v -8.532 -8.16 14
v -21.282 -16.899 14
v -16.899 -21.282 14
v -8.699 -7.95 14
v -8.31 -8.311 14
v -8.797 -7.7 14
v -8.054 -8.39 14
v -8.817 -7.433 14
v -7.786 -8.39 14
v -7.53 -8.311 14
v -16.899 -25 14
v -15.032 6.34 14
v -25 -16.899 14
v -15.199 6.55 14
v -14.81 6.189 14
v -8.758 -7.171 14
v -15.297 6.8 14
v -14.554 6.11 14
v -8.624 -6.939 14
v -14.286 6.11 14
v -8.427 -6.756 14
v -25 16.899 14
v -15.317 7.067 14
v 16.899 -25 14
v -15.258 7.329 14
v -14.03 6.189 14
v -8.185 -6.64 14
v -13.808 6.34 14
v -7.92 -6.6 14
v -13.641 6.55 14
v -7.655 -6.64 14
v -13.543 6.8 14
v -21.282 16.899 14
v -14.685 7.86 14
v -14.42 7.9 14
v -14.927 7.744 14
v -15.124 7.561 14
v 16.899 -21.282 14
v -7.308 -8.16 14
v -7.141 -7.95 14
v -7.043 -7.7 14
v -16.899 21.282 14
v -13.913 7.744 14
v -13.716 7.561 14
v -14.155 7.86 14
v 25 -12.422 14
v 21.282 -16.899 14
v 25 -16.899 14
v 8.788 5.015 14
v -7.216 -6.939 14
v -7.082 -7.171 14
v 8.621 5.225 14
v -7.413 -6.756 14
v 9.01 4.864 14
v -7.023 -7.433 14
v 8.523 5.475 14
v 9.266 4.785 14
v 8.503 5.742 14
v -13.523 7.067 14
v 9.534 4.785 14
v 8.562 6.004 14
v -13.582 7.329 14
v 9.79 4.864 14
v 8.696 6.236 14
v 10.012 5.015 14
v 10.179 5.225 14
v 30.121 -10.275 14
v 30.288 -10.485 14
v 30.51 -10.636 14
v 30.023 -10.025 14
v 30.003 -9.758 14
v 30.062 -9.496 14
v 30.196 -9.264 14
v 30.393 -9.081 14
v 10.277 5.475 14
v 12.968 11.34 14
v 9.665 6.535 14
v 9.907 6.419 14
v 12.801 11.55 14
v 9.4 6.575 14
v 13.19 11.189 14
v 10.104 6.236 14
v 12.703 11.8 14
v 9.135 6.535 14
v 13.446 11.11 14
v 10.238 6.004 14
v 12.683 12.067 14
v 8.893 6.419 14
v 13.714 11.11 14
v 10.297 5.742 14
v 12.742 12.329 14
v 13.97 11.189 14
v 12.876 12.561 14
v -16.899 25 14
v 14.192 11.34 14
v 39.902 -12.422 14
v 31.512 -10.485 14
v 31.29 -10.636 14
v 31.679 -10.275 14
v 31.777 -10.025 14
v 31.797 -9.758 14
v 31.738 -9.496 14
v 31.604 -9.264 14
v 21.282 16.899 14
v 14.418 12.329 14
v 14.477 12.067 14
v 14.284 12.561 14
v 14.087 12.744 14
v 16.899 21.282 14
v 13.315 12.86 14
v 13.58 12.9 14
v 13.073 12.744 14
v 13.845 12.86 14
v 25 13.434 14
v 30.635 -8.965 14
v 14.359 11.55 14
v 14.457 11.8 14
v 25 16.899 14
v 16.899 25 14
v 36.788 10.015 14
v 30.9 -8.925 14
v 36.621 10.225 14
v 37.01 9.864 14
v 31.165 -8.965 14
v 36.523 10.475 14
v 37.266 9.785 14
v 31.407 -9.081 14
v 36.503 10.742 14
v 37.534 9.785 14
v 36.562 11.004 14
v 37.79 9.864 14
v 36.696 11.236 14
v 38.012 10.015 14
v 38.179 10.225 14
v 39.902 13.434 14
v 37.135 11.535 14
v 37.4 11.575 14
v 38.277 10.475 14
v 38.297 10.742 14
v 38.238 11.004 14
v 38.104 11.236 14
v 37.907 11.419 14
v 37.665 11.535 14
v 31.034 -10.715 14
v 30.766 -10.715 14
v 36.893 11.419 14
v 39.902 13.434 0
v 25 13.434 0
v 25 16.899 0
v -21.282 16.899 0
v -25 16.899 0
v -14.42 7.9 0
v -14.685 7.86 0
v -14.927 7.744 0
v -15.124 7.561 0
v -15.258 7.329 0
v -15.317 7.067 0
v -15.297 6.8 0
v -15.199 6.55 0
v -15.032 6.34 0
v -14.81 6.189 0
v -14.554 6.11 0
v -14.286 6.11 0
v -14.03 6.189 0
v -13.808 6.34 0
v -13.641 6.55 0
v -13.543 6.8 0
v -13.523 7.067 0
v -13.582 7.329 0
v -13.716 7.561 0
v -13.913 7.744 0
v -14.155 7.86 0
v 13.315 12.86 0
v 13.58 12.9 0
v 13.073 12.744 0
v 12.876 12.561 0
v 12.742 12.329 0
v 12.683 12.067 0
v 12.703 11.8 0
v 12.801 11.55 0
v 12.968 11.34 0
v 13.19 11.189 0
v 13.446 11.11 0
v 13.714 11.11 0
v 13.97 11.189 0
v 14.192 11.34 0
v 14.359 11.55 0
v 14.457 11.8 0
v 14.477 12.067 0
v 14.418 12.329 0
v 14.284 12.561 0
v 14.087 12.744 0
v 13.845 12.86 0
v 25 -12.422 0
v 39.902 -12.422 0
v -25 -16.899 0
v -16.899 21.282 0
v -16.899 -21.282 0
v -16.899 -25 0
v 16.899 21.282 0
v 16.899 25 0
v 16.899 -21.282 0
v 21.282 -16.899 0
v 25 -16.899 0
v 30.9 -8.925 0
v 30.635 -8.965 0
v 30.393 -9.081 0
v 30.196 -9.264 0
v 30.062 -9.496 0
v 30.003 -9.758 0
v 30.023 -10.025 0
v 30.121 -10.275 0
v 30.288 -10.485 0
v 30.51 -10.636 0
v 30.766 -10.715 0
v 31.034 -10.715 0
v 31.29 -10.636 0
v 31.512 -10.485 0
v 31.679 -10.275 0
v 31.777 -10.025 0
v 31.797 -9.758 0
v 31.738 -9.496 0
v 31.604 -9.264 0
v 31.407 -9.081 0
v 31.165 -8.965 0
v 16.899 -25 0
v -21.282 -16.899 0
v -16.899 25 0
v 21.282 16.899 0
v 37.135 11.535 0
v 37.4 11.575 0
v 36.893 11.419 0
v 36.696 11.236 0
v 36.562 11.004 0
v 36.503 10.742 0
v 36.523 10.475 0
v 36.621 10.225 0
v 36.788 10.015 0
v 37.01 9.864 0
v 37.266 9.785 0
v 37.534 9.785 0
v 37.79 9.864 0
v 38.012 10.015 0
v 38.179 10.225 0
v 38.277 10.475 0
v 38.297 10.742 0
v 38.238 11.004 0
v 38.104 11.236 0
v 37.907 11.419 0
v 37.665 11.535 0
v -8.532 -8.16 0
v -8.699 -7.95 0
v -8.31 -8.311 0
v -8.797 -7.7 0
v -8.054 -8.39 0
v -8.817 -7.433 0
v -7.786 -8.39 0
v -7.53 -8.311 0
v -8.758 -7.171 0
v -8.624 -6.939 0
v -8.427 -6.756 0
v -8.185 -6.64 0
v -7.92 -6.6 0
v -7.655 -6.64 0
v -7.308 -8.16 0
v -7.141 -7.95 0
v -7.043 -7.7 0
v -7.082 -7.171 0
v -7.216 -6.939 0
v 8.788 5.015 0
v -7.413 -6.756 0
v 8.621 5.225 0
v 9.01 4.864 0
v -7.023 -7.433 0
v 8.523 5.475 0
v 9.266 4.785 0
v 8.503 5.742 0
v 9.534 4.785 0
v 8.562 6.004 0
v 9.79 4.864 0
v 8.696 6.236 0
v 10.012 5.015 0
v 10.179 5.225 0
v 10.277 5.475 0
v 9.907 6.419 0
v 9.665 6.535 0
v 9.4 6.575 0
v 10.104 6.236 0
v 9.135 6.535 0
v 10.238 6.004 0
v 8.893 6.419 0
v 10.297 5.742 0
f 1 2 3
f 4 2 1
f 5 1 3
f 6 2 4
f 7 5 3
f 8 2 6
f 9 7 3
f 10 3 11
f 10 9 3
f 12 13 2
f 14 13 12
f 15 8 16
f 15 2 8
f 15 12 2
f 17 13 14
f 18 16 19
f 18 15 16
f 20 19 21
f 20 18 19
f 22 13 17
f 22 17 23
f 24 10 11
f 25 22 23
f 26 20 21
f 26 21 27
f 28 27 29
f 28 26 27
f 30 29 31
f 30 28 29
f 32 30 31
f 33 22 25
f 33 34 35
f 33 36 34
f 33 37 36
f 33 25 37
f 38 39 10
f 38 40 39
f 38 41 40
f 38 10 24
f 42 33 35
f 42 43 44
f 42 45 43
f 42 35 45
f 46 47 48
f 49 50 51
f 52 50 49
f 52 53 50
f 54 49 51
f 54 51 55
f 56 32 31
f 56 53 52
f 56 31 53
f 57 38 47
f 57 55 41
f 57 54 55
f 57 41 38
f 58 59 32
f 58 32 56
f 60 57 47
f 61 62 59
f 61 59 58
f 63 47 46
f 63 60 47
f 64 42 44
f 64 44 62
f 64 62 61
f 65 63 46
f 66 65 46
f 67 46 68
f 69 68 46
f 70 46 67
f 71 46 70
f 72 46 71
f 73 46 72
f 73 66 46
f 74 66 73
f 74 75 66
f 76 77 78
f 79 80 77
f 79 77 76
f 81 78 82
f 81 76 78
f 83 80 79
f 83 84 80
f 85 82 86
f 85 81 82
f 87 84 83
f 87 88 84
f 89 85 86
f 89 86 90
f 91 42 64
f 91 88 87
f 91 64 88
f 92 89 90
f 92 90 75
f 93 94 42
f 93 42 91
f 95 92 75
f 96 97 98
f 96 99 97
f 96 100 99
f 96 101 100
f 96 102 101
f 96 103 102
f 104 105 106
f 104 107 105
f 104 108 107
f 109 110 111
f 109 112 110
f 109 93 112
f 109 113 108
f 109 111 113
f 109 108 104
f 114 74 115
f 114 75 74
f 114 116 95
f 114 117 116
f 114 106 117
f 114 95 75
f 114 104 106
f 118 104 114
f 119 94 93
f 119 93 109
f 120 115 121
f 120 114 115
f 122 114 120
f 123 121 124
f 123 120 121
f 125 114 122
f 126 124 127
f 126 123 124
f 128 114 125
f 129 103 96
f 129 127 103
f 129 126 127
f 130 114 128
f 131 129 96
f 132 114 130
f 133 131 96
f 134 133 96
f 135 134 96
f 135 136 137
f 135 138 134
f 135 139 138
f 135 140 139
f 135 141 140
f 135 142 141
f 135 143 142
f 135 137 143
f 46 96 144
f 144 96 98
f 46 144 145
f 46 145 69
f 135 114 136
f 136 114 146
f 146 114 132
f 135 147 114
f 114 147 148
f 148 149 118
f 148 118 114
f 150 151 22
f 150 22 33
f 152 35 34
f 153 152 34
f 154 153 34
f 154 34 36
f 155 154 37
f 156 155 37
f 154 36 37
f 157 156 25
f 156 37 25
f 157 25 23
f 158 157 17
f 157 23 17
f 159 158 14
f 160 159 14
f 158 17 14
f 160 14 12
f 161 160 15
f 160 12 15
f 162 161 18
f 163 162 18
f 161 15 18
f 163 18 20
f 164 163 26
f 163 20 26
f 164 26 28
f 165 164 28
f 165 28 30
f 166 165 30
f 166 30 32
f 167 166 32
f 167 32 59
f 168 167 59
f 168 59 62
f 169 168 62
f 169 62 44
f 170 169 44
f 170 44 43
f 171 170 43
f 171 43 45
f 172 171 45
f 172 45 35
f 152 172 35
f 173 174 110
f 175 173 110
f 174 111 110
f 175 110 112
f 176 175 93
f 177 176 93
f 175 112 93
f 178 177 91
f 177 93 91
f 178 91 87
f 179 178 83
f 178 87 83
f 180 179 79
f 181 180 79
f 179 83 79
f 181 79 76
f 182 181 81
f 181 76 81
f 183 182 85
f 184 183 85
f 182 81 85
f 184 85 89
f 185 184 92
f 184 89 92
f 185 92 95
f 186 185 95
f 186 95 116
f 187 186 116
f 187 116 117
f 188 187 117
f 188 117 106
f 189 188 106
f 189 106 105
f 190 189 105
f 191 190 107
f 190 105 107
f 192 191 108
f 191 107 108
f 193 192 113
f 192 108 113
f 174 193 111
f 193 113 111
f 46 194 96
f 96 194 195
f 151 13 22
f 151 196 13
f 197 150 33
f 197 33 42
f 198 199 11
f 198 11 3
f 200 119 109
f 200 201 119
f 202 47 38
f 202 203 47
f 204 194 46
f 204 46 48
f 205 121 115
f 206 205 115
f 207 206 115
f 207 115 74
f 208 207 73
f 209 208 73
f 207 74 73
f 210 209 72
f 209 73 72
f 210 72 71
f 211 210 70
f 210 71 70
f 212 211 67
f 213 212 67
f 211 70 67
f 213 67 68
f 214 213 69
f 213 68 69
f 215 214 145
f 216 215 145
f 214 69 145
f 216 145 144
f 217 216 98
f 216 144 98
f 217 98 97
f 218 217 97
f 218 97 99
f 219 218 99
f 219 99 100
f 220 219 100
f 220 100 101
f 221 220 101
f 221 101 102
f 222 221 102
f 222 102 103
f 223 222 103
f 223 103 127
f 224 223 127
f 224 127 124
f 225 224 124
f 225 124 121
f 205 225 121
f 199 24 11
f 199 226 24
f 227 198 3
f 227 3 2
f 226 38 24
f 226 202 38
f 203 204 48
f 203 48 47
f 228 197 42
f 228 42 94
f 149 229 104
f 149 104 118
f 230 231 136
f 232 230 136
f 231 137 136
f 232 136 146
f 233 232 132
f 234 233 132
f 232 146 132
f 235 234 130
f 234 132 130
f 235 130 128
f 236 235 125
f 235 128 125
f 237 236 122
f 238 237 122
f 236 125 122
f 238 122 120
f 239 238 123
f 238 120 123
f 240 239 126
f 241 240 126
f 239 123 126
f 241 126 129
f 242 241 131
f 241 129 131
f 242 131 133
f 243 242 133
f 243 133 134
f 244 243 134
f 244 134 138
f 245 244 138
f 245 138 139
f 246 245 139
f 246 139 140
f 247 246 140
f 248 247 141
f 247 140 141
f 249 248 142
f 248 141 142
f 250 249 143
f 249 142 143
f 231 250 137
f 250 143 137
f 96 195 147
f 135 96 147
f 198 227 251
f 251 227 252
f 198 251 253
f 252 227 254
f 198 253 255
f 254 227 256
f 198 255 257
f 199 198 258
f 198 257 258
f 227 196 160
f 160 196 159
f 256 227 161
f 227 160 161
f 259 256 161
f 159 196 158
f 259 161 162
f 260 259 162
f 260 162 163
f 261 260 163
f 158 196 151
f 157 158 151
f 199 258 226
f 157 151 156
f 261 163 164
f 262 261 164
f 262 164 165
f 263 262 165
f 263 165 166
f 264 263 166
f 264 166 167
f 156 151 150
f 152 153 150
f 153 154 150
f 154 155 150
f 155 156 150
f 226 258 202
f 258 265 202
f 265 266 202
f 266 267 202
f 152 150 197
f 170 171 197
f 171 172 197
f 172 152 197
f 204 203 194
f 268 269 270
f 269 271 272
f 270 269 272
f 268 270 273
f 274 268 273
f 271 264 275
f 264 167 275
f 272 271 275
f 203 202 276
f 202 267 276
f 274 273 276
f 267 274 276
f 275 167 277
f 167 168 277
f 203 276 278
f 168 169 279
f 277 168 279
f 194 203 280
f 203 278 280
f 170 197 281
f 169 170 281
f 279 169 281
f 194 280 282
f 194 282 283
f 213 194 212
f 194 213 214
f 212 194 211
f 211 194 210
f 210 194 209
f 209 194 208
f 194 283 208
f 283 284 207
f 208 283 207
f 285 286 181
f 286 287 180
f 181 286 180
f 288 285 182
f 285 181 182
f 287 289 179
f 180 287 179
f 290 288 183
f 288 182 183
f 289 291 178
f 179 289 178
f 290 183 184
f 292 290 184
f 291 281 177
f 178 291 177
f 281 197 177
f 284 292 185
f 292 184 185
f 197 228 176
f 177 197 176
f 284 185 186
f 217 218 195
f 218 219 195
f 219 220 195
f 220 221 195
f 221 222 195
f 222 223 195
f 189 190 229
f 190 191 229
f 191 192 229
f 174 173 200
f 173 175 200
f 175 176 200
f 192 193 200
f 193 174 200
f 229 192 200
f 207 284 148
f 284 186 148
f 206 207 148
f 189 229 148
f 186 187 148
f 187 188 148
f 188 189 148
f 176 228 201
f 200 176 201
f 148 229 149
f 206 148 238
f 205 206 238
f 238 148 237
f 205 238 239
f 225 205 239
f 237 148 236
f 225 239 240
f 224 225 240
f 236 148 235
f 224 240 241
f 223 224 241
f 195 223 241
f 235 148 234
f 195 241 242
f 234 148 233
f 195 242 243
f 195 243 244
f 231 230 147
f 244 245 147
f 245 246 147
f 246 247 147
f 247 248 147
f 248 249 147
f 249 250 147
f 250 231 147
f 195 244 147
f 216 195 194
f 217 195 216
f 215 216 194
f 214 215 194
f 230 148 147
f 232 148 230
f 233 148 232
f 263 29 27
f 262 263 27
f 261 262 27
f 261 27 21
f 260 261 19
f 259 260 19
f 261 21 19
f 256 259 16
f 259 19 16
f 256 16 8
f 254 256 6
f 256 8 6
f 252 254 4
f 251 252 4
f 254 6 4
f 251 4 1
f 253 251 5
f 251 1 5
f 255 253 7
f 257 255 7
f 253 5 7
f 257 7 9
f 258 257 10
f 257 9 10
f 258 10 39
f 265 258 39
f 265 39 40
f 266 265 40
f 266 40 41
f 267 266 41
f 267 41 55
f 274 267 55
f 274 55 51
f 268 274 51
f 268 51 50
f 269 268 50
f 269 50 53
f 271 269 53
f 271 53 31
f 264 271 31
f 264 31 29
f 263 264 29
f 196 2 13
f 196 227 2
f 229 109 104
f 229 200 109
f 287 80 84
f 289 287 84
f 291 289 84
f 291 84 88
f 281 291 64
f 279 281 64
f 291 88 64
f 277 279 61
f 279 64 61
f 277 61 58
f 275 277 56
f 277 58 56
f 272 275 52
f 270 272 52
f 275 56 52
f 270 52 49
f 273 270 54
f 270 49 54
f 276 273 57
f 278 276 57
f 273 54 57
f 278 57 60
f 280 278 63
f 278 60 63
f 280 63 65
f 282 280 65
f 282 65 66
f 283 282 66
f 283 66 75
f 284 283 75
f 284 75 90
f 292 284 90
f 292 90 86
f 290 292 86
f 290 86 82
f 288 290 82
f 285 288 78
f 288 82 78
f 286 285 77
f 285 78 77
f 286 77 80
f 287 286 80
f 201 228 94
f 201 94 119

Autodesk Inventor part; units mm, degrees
ref_plane "YZ Plane" through (0, 0, 0) normal (1, 0, 0) x (0, 1, 0)
ref_plane "XZ Plane" through (0, 0, 0) normal (0, 1, 0) x (-1, 0, 0)
ref_plane "XY Plane" through (0, 0, 0) normal (0, 0, 1) x (1, 0, 0)
sketch "Sketch1" plane through (0, 0, 0) normal (0, 0, 1) x (1, 0, 0)
  line L0 (-37.8611, 0) -> (52.8619, 0) construction
  line L1 (0, -34.8609) -> (0, 34.8609) construction
  line L2 (0, 0) -> (13.4339, 13.4339) construction
  line L3 (0, 0) -> (18.9985, 0) construction
  line L4 (0, 24.9006) -> (16.8, 24.9006)
  line L5 (16.8, 24.9006) -> (16.8, 21.2406)
  line L6 (16.8, 21.2406) -> (19.0203, 19.0203)
  line L7 (24.9006, 0) -> (24.9006, 16.8)
  line L8 (24.9006, 16.8) -> (21.2406, 16.8)
  line L9 (21.2406, 16.8) -> (19.0203, 19.0203)
  line L10 (0, 0) -> (-13.4339, 13.4339) construction
  line L11 (0, 0) -> (-18.9985, 0) construction
  line L12 (0, 24.9006) -> (-16.8, 24.9006)
  line L13 (-16.8, 24.9006) -> (-16.8, 21.2406)
  line L14 (-16.8, 21.2406) -> (-19.0203, 19.0203)
  line L15 (-24.9006, 0) -> (-24.9006, 16.8)
  line L16 (-24.9006, 16.8) -> (-21.2406, 16.8)
  line L17 (-21.2406, 16.8) -> (-19.0203, 19.0203)
  line L18 (0, 0) -> (13.4339, -13.4339) construction
  line L19 (0, -24.9006) -> (16.8, -24.9006)
  line L20 (16.8, -24.9006) -> (16.8, -21.2406)
  line L21 (16.8, -21.2406) -> (19.0203, -19.0203)
  line L22 (24.9006, 0) -> (24.9006, -16.8)
  line L23 (24.9006, -16.8) -> (21.2406, -16.8)
  line L24 (21.2406, -16.8) -> (19.0203, -19.0203)
  line L25 (0, 0) -> (-13.4339, -13.4339) construction
  line L26 (0, -24.9006) -> (-16.8, -24.9006)
  line L27 (-16.8, -24.9006) -> (-16.8, -21.2406)
  line L28 (-16.8, -21.2406) -> (-19.0203, -19.0203)
  line L29 (-24.9006, 0) -> (-24.9006, -16.8)
  line L30 (-24.9006, -16.8) -> (-21.2406, -16.8)
  line L31 (-21.2406, -16.8) -> (-19.0203, -19.0203)
  circle A0 centre (37.4, 10.6752) radius 1 projected
  circle A1 centre (30.9, -9.8248) radius 1 projected
  line L32 (39.9015, 13.4339) -> (24.9006, 13.4339)
  line L33 (24.9006, 13.4339) -> (24.9006, -12.4218)
  line L34 (24.9006, -12.4218) -> (39.9015, -12.4218)
  line L35 (39.9015, -12.4218) -> (39.9015, 13.4339)
  dimension "d0" = 45
  dimension "d1" = 3.14
  dimension "d2" = 3.66
  dimension "d3" = 16.8
extrude "Thickness" add sketch "Sketch1" along normal blind 14 contours L4 L5 L6 L9 L8 L7 L22 L23 L24 L21 L20 L19 L26 L27 L28 L31 L30 L29 L15 L16 L17 L14 L13 L12 | L32 L35 L34 L22 L7 | A0 | A1
sketch "Sketch3" plane through (0, 0, 0) normal (0, 0, -1) x (-1, 0, 0)
  line L0 (-16.8, 24.9006) -> (16.8, 24.9006) projected
  line L1 (16.8, 24.9006) -> (16.8, 21.2406) projected
  line L2 (16.8, 21.2406) -> (21.2406, 16.8) projected
  line L3 (21.2406, 16.8) -> (24.9006, 16.8) projected
  line L4 (24.9006, 16.8) -> (24.9006, -16.8) projected
  line L5 (24.9006, -16.8) -> (21.2406, -16.8) projected
  line L6 (21.2406, -16.8) -> (16.8, -21.2406) projected
  line L7 (16.8, -21.2406) -> (16.8, -24.9006) projected
  line L8 (16.8, -24.9006) -> (-16.8, -24.9006) projected
  line L9 (-16.8, -24.9006) -> (-16.8, -21.2406) projected
  line L10 (-16.8, -21.2406) -> (-21.2406, -16.8) projected
  line L11 (-21.2406, -16.8) -> (-24.9006, -16.8) projected
  line L12 (-24.9006, -16.8) -> (-24.9006, -12.4218) projected
  line L13 (-24.9006, 16.8) -> (-21.2406, 16.8) projected
  line L14 (-21.2406, 16.8) -> (-16.8, 21.2406) projected
  line L15 (-16.8, 21.2406) -> (-16.8, 24.9006) projected
  line L16 (16.8994, 25) -> (-16.8994, 25)
  line L17 (-16.8994, 25) -> (-16.8994, 21.2818)
  line L18 (-16.8994, 21.2818) -> (-21.2818, 16.8994)
  line L19 (-21.2818, 16.8994) -> (-25, 16.8994)
  line L20 (-25, 16.8994) -> (-25, -16.8994)
  line L21 (-25, -16.8994) -> (-21.2818, -16.8994)
  line L22 (-21.2818, -16.8994) -> (-16.8994, -21.2818)
  line L23 (-16.8994, -21.2818) -> (-16.8994, -25)
  line L24 (-16.8994, -25) -> (16.8994, -25)
  line L25 (16.8994, -25) -> (16.8994, -21.2818)
  line L26 (16.8994, -21.2818) -> (21.2818, -16.8994)
  line L27 (21.2818, -16.8994) -> (25, -16.8994)
  line L28 (25, -16.8994) -> (25, 16.8994)
  line L29 (25, 16.8994) -> (21.2818, 16.8994)
  line L30 (21.2818, 16.8994) -> (16.8994, 21.2818)
  line L31 (16.8994, 21.2818) -> (16.8994, 25)
  line L32 (-39.9015, 13.4339) -> (-24.9006, 13.4339) projected
  line L33 (-24.9006, 13.4339) -> (-24.9006, 16.8) projected
  line L34 (-24.9006, -12.4218) -> (-39.9015, -12.4218) projected
  line L35 (-39.9015, -12.4218) -> (-39.9015, 13.4339) projected
  point P0 (0, 0)
  dimension "d22" = 50
extrude "Extrusion3" add sketch "Sketch3" against normal up to surface (14 mm away)
ref_plane "Work Plane1" through (0, -16.8994, 0) normal (-1, 0, 0) x (0, 0, 1)
ref_plane "Work Plane2" through (-16.8994, 0, 0) normal (0, -1, 0) x (1, 0, 0)
sketch "Sketch4" plane through (0, 0, 0) normal (0, 0, -1) x (-1, 0, 0)
  arc A0 (12.7755, -29.7) -> (13.7755, -30.7) centre (13.7755, -29.7) ccw projected
  line L0 (13.7755, -30.7) -> (16.92, -30.7) projected
  line L1 (16.92, -30.7) -> (16.92, -5) projected
  line L2 (16.92, -5) -> (7.3923, -5) projected
  arc A1 (7.3923, -5) -> (6.3923, -6) centre (7.3923, -6) ccw projected
  line L3 (6.3923, -6) -> (6.3923, -7.8624) projected
  arc A2 (5.3923, -8.8624) -> (6.3923, -7.8624) centre (5.3923, -7.8624) ccw projected
  line L4 (5.3923, -8.8624) -> (-13.08, -8.8624) projected
  line L5 (-13.08, -8.8624) -> (-13.08, -20.397) projected
  arc A3 (-14.08, -21.397) -> (-13.08, -20.397) centre (-14.08, -20.397) ccw projected
  line L6 (-14.08, -21.397) -> (-15.08, -21.397) projected
  arc A4 (-15.08, -21.397) -> (-16.08, -22.397) centre (-15.08, -22.397) ccw projected
  line L7 (-16.08, -22.397) -> (-16.08, -24.9624) projected
  arc A5 (-16.08, -24.9624) -> (-15.08, -25.9624) centre (-15.08, -24.9624) ccw projected
  line L8 (-15.08, -25.9624) -> (11.7755, -25.9624) projected
  arc A6 (12.7755, -26.9624) -> (11.7755, -25.9624) centre (11.7755, -26.9624) ccw projected
  line L9 (12.7755, -26.9624) -> (12.7755, -29.7) projected
  line L10 (4.42, -24) -> (-11.08, -24) projected
  line L11 (-11.08, -24) -> (-11.08, -10.5) projected
  line L12 (-11.08, -10.5) -> (4.42, -10.5) projected
  line L13 (4.42, -10.5) -> (4.42, -24) projected
  circle A7 centre (14.42, -28) radius 1 projected
  circle A8 centre (7.92, -7.5) radius 1 projected
  circle A9 centre (-13.58, -23) radius 1 projected
  arc A10 (12.7755, 5.3) -> (13.7755, 4.3) centre (13.7755, 5.3) ccw projected
  line L14 (13.7755, 4.3) -> (16.92, 4.3) projected
  line L15 (16.92, 4.3) -> (16.92, 30) projected
  line L16 (16.92, 30) -> (7.3923, 30) projected
  arc A11 (7.3923, 30) -> (6.3923, 29) centre (7.3923, 29) ccw projected
  line L17 (6.3923, 29) -> (6.3923, 27.1376) projected
  arc A12 (5.3923, 26.1376) -> (6.3923, 27.1376) centre (5.3923, 27.1376) ccw projected
  line L18 (5.3923, 26.1376) -> (-13.08, 26.1376) projected
  line L19 (-13.08, 26.1376) -> (-13.08, 14.603) projected
  arc A13 (-14.08, 13.603) -> (-13.08, 14.603) centre (-14.08, 14.603) ccw projected
  line L20 (-14.08, 13.603) -> (-15.08, 13.603) projected
  arc A14 (-15.08, 13.603) -> (-16.08, 12.603) centre (-15.08, 12.603) ccw projected
  line L21 (-16.08, 12.603) -> (-16.08, 10.0376) projected
  arc A15 (-16.08, 10.0376) -> (-15.08, 9.0376) centre (-15.08, 10.0376) ccw projected
  line L22 (-15.08, 9.0376) -> (11.7755, 9.0376) projected
  arc A16 (12.7755, 8.0376) -> (11.7755, 9.0376) centre (11.7755, 8.0376) ccw projected
  line L23 (12.7755, 8.0376) -> (12.7755, 5.3) projected
  line L24 (4.42, 11) -> (-11.08, 11) projected
  line L25 (-11.08, 11) -> (-11.08, 24.5) projected
  line L26 (-11.08, 24.5) -> (4.42, 24.5) projected
  line L27 (4.42, 24.5) -> (4.42, 11) projected
  circle A17 centre (14.42, 7) radius 1 projected
  circle A18 centre (7.92, 27.5) radius 1 projected
  circle A19 centre (-13.58, 12) radius 1 projected
  arc A20 (-35.7555, 12.3752) -> (-36.7555, 13.3752) centre (-36.7555, 12.3752) ccw projected
  line L28 (-36.7555, 13.3752) -> (-39.9, 13.3752) projected
  line L29 (-39.9, 13.3752) -> (-39.9, -12.3248) projected
  line L30 (-39.9, -12.3248) -> (-30.3723, -12.3248) projected
  arc A21 (-30.3723, -12.3248) -> (-29.3723, -11.3248) centre (-30.3723, -11.3248) ccw projected
  line L31 (-29.3723, -11.3248) -> (-29.3723, -9.4624) projected
  arc A22 (-28.3723, -8.4624) -> (-29.3723, -9.4624) centre (-28.3723, -9.4624) ccw projected
  line L32 (-28.3723, -8.4624) -> (-9.9, -8.4624) projected
  line L33 (-9.9, -8.4624) -> (-9.9, 3.0723) projected
  arc A23 (-8.9, 4.0723) -> (-9.9, 3.0723) centre (-8.9, 3.0723) ccw projected
  line L34 (-8.9, 4.0723) -> (-7.9, 4.0723) projected
  arc A24 (-7.9, 4.0723) -> (-6.9, 5.0723) centre (-7.9, 5.0723) ccw projected
  line L35 (-6.9, 5.0723) -> (-6.9, 7.6376) projected
  arc A25 (-6.9, 7.6376) -> (-7.9, 8.6376) centre (-7.9, 7.6376) ccw projected
  line L36 (-7.9, 8.6376) -> (-34.7555, 8.6376) projected
  arc A26 (-35.7555, 9.6376) -> (-34.7555, 8.6376) centre (-34.7555, 9.6376) ccw projected
  line L37 (-35.7555, 9.6376) -> (-35.7555, 12.3752) projected
  line L38 (-27.4, 6.6752) -> (-11.9, 6.6752) projected
  line L39 (-11.9, 6.6752) -> (-11.9, -6.8248) projected
  line L40 (-11.9, -6.8248) -> (-27.4, -6.8248) projected
  line L41 (-27.4, -6.8248) -> (-27.4, 6.6752) projected
  circle A27 centre (-37.4, 10.6752) radius 1 projected
  circle A28 centre (-30.9, -9.8248) radius 1 projected
  circle A29 centre (-9.4, 5.6752) radius 1 projected
  point P0 (0, 0)
hole "Hole2" at (-7.92, -7.5, 0) at (-14.42, 7, 0) at (13.58, 12, 0) at (9.4, 5.6752, 0) at (30.9, -9.8248, 0) at (37.4, 10.6752, 0) direction (0, 0, 1) diameter 1.8 end through all
equation "\"Lens_diameter\" = 25.4"
properties part number "20_Cube_Insert_VCM_MirrorMount_KES400A"
